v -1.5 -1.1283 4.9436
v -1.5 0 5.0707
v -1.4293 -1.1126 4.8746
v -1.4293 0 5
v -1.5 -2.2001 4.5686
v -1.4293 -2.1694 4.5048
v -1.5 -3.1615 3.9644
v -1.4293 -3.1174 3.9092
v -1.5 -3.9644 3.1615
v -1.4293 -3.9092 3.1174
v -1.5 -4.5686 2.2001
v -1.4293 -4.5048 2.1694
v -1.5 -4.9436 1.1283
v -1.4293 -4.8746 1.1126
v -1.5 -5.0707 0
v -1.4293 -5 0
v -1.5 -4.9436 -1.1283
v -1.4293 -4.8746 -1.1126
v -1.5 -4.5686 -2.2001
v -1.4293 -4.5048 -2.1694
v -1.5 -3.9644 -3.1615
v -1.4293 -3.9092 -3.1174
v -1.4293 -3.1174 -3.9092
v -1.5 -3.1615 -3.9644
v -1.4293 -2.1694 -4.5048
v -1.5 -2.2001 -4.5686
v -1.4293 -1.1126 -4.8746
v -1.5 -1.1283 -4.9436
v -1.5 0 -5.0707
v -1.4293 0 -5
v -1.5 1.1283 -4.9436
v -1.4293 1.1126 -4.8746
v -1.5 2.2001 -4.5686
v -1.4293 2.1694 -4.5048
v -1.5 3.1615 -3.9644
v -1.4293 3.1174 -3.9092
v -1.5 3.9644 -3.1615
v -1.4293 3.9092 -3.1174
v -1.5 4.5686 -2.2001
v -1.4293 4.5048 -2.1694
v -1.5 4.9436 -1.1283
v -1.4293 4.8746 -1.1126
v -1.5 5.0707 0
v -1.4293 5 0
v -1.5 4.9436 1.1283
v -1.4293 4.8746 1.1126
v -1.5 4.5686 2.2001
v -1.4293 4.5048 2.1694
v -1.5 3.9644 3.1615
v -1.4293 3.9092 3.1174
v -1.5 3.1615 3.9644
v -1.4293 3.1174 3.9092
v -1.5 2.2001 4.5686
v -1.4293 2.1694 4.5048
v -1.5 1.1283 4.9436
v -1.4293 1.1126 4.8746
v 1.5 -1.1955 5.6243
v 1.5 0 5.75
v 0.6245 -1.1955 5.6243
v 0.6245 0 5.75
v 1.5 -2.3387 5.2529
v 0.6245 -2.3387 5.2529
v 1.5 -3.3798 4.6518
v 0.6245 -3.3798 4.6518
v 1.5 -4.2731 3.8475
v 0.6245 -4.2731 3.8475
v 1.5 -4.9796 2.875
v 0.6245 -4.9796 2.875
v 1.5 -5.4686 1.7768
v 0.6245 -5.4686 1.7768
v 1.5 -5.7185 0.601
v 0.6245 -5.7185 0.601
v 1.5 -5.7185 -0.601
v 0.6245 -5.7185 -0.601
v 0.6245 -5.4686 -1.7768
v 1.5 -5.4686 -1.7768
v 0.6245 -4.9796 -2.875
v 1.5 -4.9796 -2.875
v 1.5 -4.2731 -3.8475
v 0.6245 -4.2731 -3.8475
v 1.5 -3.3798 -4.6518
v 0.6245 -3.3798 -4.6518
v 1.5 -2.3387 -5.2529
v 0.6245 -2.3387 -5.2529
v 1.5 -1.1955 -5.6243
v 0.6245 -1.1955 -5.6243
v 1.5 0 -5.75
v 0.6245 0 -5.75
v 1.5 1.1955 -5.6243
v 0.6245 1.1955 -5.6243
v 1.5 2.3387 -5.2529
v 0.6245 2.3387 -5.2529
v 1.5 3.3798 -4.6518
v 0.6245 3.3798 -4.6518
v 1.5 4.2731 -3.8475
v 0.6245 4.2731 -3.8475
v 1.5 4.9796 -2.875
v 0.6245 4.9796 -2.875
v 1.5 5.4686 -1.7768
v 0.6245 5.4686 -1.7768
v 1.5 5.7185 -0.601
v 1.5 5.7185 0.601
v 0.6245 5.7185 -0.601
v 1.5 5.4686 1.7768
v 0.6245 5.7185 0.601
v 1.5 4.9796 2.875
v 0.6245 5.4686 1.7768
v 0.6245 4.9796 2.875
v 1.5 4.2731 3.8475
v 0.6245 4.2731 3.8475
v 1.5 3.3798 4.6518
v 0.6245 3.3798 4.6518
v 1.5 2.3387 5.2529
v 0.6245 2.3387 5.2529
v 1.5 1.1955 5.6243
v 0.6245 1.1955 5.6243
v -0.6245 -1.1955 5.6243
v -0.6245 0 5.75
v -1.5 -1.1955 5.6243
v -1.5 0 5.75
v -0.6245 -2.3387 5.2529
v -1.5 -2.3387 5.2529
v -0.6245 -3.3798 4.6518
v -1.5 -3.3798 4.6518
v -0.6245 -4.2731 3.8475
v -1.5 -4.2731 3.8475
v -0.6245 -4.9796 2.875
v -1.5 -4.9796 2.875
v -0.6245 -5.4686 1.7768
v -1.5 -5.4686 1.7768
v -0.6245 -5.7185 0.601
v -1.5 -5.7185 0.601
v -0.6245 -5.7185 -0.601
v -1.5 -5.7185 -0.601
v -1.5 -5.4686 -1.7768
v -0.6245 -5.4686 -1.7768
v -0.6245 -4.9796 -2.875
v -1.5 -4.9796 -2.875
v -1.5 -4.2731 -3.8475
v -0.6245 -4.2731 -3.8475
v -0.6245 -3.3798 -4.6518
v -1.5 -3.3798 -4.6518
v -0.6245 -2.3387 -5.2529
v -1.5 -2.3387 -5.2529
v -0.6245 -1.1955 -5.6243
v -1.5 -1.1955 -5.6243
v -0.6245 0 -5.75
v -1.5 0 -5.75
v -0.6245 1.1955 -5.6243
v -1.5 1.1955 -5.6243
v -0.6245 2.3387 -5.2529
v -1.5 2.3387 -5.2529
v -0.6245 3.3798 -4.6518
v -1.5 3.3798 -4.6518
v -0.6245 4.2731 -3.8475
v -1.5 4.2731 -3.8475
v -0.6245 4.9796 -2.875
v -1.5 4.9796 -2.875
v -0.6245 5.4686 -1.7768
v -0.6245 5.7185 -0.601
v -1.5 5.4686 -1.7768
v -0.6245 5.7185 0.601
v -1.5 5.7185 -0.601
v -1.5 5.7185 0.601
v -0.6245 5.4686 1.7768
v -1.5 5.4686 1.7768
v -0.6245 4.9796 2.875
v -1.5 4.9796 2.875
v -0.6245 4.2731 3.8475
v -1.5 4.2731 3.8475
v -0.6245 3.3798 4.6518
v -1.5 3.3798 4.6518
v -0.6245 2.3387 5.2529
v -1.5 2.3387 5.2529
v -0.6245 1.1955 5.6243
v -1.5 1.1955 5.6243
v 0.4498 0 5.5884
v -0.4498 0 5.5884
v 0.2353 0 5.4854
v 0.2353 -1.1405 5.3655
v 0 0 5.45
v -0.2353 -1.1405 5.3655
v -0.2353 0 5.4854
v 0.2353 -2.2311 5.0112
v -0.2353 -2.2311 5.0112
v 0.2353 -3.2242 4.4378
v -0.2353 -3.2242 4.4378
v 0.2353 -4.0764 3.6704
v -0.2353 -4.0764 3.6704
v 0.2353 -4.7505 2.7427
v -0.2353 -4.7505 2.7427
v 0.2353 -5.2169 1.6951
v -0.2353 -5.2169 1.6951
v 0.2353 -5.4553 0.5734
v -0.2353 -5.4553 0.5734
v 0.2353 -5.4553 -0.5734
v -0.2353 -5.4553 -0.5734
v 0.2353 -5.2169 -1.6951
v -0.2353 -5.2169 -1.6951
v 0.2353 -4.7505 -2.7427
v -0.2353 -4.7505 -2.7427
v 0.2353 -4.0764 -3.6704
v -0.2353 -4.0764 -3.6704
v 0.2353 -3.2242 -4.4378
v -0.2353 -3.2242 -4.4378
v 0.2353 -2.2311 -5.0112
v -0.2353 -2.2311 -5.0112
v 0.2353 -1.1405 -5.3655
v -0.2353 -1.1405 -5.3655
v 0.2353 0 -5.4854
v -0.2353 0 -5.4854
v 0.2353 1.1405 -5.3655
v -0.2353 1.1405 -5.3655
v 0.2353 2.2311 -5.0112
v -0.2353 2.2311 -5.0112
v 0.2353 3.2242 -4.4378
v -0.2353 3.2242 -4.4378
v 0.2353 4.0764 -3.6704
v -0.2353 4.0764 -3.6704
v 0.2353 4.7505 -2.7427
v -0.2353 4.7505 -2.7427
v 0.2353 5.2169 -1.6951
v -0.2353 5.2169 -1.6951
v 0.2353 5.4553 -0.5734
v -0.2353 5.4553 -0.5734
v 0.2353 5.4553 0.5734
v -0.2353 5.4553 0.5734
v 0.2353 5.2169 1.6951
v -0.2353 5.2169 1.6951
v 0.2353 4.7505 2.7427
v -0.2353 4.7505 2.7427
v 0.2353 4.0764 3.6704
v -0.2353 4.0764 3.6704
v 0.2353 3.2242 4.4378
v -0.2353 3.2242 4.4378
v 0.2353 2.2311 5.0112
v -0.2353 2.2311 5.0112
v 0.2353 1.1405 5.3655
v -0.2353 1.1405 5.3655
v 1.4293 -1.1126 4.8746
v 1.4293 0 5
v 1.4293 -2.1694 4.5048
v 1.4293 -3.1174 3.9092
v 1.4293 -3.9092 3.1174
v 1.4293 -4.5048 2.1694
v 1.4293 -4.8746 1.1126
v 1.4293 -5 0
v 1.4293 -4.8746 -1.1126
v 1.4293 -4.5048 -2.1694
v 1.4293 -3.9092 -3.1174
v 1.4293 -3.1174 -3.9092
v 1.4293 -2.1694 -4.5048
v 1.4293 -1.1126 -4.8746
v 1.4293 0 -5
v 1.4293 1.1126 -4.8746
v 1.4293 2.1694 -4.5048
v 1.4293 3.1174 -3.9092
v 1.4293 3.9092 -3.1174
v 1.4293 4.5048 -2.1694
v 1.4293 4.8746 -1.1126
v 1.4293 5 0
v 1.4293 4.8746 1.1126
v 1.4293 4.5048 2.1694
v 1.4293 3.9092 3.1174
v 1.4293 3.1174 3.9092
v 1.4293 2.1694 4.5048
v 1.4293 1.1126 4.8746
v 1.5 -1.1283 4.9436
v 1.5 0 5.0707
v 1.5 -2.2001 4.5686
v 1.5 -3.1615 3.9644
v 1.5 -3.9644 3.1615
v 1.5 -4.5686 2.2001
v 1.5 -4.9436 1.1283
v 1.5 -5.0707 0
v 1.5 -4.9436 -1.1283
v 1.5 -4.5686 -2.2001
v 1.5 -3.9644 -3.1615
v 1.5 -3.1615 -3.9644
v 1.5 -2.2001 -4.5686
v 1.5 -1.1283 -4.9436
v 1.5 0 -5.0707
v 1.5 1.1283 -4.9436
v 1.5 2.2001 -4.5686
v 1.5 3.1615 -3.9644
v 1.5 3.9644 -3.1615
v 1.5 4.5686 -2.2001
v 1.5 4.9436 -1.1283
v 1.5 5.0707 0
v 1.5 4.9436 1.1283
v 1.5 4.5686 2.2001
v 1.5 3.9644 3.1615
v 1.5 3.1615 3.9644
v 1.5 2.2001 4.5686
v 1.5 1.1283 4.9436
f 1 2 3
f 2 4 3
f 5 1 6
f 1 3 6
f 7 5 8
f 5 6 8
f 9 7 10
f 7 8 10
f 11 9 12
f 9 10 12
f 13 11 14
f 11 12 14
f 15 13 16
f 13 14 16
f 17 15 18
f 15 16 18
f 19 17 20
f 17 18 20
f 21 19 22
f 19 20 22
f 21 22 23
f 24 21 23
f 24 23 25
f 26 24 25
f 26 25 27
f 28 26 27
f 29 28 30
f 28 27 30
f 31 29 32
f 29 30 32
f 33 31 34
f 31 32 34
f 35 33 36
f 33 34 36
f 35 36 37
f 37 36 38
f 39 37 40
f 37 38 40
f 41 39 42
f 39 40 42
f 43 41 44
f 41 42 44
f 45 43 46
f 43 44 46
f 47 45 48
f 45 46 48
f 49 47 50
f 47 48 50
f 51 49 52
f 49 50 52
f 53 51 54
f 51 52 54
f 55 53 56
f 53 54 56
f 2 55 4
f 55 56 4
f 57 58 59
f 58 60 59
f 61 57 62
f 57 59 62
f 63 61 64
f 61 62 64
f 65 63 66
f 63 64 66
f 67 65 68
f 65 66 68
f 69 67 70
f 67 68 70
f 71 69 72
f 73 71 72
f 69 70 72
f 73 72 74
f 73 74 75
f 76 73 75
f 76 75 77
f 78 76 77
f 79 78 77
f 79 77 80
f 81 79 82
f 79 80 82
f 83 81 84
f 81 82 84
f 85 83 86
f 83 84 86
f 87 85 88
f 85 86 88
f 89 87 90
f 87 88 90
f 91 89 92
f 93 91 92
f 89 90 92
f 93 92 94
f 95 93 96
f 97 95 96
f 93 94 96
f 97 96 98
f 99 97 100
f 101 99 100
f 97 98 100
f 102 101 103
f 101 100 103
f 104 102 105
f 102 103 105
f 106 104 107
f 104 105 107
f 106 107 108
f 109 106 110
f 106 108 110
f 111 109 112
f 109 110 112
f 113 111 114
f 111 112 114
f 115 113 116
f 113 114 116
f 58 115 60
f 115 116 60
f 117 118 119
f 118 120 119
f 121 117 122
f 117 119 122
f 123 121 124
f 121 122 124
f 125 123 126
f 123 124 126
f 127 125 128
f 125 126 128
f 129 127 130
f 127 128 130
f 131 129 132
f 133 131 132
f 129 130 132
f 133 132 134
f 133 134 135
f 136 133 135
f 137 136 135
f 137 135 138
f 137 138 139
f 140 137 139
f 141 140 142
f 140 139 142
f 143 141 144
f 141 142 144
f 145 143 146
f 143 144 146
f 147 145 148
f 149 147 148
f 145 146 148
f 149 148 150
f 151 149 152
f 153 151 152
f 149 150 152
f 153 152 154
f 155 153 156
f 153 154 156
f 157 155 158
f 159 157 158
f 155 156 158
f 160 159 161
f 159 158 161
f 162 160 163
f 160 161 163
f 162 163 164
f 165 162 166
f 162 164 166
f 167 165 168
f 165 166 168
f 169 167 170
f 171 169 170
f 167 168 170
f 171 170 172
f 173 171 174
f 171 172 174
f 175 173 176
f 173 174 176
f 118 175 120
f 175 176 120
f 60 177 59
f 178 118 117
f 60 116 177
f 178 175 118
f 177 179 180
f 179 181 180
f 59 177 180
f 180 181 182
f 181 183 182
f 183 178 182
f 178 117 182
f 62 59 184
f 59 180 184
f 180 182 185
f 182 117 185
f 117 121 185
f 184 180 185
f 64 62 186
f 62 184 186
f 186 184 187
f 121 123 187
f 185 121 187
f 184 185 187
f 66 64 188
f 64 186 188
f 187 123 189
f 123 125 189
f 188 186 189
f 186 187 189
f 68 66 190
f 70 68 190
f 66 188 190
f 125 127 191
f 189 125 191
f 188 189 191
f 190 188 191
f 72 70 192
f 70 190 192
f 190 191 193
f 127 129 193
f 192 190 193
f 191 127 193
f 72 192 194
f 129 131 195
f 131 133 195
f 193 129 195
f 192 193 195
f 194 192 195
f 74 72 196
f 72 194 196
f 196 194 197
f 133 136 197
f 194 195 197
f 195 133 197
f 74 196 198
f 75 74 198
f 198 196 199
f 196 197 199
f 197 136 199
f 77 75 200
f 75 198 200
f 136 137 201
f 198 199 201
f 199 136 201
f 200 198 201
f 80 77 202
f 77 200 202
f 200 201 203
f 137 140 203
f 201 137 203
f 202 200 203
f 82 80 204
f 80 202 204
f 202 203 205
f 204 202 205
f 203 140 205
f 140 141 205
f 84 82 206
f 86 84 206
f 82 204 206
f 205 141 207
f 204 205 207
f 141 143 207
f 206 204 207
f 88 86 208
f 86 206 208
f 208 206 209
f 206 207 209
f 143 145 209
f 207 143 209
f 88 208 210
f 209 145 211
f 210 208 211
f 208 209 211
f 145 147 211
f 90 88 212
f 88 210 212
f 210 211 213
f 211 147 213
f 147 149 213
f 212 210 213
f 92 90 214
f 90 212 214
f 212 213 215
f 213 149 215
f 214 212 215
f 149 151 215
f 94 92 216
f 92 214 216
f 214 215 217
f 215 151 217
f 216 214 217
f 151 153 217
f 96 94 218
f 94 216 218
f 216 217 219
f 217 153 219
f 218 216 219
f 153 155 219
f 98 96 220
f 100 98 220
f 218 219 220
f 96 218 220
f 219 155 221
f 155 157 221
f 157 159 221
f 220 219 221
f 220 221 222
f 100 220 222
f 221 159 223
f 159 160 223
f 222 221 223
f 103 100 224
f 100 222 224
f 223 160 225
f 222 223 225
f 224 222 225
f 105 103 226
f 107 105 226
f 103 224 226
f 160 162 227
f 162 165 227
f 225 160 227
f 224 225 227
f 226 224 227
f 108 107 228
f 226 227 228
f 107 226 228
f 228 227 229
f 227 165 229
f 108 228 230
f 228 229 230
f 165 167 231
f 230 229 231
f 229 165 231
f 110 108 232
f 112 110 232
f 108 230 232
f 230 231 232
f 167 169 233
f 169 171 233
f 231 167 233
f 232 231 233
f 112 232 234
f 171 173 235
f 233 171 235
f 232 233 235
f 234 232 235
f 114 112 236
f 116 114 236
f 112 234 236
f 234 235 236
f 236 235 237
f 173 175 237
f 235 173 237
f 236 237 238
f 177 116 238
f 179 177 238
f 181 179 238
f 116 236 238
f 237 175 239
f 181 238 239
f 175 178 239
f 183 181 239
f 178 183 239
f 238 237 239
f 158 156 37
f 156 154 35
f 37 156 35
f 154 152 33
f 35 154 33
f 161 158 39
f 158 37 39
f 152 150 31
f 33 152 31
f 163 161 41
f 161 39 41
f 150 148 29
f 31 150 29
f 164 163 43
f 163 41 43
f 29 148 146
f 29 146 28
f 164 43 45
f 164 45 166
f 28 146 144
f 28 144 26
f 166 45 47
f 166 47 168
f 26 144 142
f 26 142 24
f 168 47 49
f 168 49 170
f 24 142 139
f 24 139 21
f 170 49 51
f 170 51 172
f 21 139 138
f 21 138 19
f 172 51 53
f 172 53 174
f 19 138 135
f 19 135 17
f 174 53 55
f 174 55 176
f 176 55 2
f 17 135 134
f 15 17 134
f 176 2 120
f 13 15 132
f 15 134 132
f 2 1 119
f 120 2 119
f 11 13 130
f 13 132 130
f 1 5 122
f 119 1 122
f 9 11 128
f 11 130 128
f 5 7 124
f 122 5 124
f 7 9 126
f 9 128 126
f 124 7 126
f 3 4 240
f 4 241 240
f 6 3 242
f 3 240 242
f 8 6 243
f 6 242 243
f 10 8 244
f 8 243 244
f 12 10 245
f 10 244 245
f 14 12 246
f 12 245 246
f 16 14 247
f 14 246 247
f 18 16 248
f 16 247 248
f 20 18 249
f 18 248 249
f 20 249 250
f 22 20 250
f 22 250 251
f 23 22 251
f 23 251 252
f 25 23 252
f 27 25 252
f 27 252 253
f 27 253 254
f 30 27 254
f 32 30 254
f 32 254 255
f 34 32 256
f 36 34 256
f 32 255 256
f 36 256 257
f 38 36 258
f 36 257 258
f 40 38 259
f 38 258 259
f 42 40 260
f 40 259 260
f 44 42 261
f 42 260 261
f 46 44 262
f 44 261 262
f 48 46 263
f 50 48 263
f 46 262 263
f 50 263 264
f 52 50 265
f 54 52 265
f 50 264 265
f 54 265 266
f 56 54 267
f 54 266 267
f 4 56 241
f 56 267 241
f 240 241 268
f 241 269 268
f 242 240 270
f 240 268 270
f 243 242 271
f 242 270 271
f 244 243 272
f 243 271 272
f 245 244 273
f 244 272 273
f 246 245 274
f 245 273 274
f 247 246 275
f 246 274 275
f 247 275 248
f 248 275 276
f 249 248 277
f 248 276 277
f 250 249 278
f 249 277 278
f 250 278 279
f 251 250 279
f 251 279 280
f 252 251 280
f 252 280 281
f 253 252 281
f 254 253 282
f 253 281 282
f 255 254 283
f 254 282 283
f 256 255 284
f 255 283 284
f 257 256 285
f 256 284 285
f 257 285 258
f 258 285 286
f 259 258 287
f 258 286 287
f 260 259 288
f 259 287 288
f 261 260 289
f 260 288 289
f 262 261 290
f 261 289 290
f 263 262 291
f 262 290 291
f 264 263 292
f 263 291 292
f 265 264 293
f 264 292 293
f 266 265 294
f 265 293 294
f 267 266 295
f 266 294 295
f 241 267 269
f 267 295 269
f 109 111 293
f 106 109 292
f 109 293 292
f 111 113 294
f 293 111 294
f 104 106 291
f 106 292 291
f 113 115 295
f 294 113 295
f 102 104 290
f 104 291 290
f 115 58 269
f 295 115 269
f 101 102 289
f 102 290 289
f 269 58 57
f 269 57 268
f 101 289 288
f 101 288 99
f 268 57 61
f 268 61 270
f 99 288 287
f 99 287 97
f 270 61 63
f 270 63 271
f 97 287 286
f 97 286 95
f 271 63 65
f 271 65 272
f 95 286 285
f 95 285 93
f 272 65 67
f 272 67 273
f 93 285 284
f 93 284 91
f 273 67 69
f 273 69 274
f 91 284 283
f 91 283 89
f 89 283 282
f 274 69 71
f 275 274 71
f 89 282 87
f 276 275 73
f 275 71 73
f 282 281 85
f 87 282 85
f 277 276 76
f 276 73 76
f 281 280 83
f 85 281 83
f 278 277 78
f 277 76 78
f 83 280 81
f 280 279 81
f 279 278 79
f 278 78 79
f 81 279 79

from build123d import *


with BuildPart() as part:
    # Szkic1 → Obrót1 (revolve)
    with BuildSketch(Plane.XY, mode=Mode.PRIVATE) as obr_t1_sk:
        with BuildLine():
            Line((-1.429289322, 5), (1.429289322, 5))
            Line((1.429289322, 5), (1.5, 5.070710678))
            Line((1.5, 5.070710678), (1.5, 5.75))
            Line((1.5, 5.75), (0.6244998, 5.75))
            ThreePointArc((0.6244998, 5.75), (0, 5.45), (-0.6244998, 5.75))
            Line((-0.6244998, 5.75), (-1.5, 5.75))
            Line((-1.5, 5.75), (-1.5, 5.070710678))
            Line((-1.5, 5.070710678), (-1.429289322, 5))
        make_face()
    revolve(obr_t1_sk.sketch.rotate(Axis((-1.5, 0, 0), (1, 0, 0)), 90), axis=Axis((-1.5, 0, 0), (1, 0, 0)))


solid = part.part
